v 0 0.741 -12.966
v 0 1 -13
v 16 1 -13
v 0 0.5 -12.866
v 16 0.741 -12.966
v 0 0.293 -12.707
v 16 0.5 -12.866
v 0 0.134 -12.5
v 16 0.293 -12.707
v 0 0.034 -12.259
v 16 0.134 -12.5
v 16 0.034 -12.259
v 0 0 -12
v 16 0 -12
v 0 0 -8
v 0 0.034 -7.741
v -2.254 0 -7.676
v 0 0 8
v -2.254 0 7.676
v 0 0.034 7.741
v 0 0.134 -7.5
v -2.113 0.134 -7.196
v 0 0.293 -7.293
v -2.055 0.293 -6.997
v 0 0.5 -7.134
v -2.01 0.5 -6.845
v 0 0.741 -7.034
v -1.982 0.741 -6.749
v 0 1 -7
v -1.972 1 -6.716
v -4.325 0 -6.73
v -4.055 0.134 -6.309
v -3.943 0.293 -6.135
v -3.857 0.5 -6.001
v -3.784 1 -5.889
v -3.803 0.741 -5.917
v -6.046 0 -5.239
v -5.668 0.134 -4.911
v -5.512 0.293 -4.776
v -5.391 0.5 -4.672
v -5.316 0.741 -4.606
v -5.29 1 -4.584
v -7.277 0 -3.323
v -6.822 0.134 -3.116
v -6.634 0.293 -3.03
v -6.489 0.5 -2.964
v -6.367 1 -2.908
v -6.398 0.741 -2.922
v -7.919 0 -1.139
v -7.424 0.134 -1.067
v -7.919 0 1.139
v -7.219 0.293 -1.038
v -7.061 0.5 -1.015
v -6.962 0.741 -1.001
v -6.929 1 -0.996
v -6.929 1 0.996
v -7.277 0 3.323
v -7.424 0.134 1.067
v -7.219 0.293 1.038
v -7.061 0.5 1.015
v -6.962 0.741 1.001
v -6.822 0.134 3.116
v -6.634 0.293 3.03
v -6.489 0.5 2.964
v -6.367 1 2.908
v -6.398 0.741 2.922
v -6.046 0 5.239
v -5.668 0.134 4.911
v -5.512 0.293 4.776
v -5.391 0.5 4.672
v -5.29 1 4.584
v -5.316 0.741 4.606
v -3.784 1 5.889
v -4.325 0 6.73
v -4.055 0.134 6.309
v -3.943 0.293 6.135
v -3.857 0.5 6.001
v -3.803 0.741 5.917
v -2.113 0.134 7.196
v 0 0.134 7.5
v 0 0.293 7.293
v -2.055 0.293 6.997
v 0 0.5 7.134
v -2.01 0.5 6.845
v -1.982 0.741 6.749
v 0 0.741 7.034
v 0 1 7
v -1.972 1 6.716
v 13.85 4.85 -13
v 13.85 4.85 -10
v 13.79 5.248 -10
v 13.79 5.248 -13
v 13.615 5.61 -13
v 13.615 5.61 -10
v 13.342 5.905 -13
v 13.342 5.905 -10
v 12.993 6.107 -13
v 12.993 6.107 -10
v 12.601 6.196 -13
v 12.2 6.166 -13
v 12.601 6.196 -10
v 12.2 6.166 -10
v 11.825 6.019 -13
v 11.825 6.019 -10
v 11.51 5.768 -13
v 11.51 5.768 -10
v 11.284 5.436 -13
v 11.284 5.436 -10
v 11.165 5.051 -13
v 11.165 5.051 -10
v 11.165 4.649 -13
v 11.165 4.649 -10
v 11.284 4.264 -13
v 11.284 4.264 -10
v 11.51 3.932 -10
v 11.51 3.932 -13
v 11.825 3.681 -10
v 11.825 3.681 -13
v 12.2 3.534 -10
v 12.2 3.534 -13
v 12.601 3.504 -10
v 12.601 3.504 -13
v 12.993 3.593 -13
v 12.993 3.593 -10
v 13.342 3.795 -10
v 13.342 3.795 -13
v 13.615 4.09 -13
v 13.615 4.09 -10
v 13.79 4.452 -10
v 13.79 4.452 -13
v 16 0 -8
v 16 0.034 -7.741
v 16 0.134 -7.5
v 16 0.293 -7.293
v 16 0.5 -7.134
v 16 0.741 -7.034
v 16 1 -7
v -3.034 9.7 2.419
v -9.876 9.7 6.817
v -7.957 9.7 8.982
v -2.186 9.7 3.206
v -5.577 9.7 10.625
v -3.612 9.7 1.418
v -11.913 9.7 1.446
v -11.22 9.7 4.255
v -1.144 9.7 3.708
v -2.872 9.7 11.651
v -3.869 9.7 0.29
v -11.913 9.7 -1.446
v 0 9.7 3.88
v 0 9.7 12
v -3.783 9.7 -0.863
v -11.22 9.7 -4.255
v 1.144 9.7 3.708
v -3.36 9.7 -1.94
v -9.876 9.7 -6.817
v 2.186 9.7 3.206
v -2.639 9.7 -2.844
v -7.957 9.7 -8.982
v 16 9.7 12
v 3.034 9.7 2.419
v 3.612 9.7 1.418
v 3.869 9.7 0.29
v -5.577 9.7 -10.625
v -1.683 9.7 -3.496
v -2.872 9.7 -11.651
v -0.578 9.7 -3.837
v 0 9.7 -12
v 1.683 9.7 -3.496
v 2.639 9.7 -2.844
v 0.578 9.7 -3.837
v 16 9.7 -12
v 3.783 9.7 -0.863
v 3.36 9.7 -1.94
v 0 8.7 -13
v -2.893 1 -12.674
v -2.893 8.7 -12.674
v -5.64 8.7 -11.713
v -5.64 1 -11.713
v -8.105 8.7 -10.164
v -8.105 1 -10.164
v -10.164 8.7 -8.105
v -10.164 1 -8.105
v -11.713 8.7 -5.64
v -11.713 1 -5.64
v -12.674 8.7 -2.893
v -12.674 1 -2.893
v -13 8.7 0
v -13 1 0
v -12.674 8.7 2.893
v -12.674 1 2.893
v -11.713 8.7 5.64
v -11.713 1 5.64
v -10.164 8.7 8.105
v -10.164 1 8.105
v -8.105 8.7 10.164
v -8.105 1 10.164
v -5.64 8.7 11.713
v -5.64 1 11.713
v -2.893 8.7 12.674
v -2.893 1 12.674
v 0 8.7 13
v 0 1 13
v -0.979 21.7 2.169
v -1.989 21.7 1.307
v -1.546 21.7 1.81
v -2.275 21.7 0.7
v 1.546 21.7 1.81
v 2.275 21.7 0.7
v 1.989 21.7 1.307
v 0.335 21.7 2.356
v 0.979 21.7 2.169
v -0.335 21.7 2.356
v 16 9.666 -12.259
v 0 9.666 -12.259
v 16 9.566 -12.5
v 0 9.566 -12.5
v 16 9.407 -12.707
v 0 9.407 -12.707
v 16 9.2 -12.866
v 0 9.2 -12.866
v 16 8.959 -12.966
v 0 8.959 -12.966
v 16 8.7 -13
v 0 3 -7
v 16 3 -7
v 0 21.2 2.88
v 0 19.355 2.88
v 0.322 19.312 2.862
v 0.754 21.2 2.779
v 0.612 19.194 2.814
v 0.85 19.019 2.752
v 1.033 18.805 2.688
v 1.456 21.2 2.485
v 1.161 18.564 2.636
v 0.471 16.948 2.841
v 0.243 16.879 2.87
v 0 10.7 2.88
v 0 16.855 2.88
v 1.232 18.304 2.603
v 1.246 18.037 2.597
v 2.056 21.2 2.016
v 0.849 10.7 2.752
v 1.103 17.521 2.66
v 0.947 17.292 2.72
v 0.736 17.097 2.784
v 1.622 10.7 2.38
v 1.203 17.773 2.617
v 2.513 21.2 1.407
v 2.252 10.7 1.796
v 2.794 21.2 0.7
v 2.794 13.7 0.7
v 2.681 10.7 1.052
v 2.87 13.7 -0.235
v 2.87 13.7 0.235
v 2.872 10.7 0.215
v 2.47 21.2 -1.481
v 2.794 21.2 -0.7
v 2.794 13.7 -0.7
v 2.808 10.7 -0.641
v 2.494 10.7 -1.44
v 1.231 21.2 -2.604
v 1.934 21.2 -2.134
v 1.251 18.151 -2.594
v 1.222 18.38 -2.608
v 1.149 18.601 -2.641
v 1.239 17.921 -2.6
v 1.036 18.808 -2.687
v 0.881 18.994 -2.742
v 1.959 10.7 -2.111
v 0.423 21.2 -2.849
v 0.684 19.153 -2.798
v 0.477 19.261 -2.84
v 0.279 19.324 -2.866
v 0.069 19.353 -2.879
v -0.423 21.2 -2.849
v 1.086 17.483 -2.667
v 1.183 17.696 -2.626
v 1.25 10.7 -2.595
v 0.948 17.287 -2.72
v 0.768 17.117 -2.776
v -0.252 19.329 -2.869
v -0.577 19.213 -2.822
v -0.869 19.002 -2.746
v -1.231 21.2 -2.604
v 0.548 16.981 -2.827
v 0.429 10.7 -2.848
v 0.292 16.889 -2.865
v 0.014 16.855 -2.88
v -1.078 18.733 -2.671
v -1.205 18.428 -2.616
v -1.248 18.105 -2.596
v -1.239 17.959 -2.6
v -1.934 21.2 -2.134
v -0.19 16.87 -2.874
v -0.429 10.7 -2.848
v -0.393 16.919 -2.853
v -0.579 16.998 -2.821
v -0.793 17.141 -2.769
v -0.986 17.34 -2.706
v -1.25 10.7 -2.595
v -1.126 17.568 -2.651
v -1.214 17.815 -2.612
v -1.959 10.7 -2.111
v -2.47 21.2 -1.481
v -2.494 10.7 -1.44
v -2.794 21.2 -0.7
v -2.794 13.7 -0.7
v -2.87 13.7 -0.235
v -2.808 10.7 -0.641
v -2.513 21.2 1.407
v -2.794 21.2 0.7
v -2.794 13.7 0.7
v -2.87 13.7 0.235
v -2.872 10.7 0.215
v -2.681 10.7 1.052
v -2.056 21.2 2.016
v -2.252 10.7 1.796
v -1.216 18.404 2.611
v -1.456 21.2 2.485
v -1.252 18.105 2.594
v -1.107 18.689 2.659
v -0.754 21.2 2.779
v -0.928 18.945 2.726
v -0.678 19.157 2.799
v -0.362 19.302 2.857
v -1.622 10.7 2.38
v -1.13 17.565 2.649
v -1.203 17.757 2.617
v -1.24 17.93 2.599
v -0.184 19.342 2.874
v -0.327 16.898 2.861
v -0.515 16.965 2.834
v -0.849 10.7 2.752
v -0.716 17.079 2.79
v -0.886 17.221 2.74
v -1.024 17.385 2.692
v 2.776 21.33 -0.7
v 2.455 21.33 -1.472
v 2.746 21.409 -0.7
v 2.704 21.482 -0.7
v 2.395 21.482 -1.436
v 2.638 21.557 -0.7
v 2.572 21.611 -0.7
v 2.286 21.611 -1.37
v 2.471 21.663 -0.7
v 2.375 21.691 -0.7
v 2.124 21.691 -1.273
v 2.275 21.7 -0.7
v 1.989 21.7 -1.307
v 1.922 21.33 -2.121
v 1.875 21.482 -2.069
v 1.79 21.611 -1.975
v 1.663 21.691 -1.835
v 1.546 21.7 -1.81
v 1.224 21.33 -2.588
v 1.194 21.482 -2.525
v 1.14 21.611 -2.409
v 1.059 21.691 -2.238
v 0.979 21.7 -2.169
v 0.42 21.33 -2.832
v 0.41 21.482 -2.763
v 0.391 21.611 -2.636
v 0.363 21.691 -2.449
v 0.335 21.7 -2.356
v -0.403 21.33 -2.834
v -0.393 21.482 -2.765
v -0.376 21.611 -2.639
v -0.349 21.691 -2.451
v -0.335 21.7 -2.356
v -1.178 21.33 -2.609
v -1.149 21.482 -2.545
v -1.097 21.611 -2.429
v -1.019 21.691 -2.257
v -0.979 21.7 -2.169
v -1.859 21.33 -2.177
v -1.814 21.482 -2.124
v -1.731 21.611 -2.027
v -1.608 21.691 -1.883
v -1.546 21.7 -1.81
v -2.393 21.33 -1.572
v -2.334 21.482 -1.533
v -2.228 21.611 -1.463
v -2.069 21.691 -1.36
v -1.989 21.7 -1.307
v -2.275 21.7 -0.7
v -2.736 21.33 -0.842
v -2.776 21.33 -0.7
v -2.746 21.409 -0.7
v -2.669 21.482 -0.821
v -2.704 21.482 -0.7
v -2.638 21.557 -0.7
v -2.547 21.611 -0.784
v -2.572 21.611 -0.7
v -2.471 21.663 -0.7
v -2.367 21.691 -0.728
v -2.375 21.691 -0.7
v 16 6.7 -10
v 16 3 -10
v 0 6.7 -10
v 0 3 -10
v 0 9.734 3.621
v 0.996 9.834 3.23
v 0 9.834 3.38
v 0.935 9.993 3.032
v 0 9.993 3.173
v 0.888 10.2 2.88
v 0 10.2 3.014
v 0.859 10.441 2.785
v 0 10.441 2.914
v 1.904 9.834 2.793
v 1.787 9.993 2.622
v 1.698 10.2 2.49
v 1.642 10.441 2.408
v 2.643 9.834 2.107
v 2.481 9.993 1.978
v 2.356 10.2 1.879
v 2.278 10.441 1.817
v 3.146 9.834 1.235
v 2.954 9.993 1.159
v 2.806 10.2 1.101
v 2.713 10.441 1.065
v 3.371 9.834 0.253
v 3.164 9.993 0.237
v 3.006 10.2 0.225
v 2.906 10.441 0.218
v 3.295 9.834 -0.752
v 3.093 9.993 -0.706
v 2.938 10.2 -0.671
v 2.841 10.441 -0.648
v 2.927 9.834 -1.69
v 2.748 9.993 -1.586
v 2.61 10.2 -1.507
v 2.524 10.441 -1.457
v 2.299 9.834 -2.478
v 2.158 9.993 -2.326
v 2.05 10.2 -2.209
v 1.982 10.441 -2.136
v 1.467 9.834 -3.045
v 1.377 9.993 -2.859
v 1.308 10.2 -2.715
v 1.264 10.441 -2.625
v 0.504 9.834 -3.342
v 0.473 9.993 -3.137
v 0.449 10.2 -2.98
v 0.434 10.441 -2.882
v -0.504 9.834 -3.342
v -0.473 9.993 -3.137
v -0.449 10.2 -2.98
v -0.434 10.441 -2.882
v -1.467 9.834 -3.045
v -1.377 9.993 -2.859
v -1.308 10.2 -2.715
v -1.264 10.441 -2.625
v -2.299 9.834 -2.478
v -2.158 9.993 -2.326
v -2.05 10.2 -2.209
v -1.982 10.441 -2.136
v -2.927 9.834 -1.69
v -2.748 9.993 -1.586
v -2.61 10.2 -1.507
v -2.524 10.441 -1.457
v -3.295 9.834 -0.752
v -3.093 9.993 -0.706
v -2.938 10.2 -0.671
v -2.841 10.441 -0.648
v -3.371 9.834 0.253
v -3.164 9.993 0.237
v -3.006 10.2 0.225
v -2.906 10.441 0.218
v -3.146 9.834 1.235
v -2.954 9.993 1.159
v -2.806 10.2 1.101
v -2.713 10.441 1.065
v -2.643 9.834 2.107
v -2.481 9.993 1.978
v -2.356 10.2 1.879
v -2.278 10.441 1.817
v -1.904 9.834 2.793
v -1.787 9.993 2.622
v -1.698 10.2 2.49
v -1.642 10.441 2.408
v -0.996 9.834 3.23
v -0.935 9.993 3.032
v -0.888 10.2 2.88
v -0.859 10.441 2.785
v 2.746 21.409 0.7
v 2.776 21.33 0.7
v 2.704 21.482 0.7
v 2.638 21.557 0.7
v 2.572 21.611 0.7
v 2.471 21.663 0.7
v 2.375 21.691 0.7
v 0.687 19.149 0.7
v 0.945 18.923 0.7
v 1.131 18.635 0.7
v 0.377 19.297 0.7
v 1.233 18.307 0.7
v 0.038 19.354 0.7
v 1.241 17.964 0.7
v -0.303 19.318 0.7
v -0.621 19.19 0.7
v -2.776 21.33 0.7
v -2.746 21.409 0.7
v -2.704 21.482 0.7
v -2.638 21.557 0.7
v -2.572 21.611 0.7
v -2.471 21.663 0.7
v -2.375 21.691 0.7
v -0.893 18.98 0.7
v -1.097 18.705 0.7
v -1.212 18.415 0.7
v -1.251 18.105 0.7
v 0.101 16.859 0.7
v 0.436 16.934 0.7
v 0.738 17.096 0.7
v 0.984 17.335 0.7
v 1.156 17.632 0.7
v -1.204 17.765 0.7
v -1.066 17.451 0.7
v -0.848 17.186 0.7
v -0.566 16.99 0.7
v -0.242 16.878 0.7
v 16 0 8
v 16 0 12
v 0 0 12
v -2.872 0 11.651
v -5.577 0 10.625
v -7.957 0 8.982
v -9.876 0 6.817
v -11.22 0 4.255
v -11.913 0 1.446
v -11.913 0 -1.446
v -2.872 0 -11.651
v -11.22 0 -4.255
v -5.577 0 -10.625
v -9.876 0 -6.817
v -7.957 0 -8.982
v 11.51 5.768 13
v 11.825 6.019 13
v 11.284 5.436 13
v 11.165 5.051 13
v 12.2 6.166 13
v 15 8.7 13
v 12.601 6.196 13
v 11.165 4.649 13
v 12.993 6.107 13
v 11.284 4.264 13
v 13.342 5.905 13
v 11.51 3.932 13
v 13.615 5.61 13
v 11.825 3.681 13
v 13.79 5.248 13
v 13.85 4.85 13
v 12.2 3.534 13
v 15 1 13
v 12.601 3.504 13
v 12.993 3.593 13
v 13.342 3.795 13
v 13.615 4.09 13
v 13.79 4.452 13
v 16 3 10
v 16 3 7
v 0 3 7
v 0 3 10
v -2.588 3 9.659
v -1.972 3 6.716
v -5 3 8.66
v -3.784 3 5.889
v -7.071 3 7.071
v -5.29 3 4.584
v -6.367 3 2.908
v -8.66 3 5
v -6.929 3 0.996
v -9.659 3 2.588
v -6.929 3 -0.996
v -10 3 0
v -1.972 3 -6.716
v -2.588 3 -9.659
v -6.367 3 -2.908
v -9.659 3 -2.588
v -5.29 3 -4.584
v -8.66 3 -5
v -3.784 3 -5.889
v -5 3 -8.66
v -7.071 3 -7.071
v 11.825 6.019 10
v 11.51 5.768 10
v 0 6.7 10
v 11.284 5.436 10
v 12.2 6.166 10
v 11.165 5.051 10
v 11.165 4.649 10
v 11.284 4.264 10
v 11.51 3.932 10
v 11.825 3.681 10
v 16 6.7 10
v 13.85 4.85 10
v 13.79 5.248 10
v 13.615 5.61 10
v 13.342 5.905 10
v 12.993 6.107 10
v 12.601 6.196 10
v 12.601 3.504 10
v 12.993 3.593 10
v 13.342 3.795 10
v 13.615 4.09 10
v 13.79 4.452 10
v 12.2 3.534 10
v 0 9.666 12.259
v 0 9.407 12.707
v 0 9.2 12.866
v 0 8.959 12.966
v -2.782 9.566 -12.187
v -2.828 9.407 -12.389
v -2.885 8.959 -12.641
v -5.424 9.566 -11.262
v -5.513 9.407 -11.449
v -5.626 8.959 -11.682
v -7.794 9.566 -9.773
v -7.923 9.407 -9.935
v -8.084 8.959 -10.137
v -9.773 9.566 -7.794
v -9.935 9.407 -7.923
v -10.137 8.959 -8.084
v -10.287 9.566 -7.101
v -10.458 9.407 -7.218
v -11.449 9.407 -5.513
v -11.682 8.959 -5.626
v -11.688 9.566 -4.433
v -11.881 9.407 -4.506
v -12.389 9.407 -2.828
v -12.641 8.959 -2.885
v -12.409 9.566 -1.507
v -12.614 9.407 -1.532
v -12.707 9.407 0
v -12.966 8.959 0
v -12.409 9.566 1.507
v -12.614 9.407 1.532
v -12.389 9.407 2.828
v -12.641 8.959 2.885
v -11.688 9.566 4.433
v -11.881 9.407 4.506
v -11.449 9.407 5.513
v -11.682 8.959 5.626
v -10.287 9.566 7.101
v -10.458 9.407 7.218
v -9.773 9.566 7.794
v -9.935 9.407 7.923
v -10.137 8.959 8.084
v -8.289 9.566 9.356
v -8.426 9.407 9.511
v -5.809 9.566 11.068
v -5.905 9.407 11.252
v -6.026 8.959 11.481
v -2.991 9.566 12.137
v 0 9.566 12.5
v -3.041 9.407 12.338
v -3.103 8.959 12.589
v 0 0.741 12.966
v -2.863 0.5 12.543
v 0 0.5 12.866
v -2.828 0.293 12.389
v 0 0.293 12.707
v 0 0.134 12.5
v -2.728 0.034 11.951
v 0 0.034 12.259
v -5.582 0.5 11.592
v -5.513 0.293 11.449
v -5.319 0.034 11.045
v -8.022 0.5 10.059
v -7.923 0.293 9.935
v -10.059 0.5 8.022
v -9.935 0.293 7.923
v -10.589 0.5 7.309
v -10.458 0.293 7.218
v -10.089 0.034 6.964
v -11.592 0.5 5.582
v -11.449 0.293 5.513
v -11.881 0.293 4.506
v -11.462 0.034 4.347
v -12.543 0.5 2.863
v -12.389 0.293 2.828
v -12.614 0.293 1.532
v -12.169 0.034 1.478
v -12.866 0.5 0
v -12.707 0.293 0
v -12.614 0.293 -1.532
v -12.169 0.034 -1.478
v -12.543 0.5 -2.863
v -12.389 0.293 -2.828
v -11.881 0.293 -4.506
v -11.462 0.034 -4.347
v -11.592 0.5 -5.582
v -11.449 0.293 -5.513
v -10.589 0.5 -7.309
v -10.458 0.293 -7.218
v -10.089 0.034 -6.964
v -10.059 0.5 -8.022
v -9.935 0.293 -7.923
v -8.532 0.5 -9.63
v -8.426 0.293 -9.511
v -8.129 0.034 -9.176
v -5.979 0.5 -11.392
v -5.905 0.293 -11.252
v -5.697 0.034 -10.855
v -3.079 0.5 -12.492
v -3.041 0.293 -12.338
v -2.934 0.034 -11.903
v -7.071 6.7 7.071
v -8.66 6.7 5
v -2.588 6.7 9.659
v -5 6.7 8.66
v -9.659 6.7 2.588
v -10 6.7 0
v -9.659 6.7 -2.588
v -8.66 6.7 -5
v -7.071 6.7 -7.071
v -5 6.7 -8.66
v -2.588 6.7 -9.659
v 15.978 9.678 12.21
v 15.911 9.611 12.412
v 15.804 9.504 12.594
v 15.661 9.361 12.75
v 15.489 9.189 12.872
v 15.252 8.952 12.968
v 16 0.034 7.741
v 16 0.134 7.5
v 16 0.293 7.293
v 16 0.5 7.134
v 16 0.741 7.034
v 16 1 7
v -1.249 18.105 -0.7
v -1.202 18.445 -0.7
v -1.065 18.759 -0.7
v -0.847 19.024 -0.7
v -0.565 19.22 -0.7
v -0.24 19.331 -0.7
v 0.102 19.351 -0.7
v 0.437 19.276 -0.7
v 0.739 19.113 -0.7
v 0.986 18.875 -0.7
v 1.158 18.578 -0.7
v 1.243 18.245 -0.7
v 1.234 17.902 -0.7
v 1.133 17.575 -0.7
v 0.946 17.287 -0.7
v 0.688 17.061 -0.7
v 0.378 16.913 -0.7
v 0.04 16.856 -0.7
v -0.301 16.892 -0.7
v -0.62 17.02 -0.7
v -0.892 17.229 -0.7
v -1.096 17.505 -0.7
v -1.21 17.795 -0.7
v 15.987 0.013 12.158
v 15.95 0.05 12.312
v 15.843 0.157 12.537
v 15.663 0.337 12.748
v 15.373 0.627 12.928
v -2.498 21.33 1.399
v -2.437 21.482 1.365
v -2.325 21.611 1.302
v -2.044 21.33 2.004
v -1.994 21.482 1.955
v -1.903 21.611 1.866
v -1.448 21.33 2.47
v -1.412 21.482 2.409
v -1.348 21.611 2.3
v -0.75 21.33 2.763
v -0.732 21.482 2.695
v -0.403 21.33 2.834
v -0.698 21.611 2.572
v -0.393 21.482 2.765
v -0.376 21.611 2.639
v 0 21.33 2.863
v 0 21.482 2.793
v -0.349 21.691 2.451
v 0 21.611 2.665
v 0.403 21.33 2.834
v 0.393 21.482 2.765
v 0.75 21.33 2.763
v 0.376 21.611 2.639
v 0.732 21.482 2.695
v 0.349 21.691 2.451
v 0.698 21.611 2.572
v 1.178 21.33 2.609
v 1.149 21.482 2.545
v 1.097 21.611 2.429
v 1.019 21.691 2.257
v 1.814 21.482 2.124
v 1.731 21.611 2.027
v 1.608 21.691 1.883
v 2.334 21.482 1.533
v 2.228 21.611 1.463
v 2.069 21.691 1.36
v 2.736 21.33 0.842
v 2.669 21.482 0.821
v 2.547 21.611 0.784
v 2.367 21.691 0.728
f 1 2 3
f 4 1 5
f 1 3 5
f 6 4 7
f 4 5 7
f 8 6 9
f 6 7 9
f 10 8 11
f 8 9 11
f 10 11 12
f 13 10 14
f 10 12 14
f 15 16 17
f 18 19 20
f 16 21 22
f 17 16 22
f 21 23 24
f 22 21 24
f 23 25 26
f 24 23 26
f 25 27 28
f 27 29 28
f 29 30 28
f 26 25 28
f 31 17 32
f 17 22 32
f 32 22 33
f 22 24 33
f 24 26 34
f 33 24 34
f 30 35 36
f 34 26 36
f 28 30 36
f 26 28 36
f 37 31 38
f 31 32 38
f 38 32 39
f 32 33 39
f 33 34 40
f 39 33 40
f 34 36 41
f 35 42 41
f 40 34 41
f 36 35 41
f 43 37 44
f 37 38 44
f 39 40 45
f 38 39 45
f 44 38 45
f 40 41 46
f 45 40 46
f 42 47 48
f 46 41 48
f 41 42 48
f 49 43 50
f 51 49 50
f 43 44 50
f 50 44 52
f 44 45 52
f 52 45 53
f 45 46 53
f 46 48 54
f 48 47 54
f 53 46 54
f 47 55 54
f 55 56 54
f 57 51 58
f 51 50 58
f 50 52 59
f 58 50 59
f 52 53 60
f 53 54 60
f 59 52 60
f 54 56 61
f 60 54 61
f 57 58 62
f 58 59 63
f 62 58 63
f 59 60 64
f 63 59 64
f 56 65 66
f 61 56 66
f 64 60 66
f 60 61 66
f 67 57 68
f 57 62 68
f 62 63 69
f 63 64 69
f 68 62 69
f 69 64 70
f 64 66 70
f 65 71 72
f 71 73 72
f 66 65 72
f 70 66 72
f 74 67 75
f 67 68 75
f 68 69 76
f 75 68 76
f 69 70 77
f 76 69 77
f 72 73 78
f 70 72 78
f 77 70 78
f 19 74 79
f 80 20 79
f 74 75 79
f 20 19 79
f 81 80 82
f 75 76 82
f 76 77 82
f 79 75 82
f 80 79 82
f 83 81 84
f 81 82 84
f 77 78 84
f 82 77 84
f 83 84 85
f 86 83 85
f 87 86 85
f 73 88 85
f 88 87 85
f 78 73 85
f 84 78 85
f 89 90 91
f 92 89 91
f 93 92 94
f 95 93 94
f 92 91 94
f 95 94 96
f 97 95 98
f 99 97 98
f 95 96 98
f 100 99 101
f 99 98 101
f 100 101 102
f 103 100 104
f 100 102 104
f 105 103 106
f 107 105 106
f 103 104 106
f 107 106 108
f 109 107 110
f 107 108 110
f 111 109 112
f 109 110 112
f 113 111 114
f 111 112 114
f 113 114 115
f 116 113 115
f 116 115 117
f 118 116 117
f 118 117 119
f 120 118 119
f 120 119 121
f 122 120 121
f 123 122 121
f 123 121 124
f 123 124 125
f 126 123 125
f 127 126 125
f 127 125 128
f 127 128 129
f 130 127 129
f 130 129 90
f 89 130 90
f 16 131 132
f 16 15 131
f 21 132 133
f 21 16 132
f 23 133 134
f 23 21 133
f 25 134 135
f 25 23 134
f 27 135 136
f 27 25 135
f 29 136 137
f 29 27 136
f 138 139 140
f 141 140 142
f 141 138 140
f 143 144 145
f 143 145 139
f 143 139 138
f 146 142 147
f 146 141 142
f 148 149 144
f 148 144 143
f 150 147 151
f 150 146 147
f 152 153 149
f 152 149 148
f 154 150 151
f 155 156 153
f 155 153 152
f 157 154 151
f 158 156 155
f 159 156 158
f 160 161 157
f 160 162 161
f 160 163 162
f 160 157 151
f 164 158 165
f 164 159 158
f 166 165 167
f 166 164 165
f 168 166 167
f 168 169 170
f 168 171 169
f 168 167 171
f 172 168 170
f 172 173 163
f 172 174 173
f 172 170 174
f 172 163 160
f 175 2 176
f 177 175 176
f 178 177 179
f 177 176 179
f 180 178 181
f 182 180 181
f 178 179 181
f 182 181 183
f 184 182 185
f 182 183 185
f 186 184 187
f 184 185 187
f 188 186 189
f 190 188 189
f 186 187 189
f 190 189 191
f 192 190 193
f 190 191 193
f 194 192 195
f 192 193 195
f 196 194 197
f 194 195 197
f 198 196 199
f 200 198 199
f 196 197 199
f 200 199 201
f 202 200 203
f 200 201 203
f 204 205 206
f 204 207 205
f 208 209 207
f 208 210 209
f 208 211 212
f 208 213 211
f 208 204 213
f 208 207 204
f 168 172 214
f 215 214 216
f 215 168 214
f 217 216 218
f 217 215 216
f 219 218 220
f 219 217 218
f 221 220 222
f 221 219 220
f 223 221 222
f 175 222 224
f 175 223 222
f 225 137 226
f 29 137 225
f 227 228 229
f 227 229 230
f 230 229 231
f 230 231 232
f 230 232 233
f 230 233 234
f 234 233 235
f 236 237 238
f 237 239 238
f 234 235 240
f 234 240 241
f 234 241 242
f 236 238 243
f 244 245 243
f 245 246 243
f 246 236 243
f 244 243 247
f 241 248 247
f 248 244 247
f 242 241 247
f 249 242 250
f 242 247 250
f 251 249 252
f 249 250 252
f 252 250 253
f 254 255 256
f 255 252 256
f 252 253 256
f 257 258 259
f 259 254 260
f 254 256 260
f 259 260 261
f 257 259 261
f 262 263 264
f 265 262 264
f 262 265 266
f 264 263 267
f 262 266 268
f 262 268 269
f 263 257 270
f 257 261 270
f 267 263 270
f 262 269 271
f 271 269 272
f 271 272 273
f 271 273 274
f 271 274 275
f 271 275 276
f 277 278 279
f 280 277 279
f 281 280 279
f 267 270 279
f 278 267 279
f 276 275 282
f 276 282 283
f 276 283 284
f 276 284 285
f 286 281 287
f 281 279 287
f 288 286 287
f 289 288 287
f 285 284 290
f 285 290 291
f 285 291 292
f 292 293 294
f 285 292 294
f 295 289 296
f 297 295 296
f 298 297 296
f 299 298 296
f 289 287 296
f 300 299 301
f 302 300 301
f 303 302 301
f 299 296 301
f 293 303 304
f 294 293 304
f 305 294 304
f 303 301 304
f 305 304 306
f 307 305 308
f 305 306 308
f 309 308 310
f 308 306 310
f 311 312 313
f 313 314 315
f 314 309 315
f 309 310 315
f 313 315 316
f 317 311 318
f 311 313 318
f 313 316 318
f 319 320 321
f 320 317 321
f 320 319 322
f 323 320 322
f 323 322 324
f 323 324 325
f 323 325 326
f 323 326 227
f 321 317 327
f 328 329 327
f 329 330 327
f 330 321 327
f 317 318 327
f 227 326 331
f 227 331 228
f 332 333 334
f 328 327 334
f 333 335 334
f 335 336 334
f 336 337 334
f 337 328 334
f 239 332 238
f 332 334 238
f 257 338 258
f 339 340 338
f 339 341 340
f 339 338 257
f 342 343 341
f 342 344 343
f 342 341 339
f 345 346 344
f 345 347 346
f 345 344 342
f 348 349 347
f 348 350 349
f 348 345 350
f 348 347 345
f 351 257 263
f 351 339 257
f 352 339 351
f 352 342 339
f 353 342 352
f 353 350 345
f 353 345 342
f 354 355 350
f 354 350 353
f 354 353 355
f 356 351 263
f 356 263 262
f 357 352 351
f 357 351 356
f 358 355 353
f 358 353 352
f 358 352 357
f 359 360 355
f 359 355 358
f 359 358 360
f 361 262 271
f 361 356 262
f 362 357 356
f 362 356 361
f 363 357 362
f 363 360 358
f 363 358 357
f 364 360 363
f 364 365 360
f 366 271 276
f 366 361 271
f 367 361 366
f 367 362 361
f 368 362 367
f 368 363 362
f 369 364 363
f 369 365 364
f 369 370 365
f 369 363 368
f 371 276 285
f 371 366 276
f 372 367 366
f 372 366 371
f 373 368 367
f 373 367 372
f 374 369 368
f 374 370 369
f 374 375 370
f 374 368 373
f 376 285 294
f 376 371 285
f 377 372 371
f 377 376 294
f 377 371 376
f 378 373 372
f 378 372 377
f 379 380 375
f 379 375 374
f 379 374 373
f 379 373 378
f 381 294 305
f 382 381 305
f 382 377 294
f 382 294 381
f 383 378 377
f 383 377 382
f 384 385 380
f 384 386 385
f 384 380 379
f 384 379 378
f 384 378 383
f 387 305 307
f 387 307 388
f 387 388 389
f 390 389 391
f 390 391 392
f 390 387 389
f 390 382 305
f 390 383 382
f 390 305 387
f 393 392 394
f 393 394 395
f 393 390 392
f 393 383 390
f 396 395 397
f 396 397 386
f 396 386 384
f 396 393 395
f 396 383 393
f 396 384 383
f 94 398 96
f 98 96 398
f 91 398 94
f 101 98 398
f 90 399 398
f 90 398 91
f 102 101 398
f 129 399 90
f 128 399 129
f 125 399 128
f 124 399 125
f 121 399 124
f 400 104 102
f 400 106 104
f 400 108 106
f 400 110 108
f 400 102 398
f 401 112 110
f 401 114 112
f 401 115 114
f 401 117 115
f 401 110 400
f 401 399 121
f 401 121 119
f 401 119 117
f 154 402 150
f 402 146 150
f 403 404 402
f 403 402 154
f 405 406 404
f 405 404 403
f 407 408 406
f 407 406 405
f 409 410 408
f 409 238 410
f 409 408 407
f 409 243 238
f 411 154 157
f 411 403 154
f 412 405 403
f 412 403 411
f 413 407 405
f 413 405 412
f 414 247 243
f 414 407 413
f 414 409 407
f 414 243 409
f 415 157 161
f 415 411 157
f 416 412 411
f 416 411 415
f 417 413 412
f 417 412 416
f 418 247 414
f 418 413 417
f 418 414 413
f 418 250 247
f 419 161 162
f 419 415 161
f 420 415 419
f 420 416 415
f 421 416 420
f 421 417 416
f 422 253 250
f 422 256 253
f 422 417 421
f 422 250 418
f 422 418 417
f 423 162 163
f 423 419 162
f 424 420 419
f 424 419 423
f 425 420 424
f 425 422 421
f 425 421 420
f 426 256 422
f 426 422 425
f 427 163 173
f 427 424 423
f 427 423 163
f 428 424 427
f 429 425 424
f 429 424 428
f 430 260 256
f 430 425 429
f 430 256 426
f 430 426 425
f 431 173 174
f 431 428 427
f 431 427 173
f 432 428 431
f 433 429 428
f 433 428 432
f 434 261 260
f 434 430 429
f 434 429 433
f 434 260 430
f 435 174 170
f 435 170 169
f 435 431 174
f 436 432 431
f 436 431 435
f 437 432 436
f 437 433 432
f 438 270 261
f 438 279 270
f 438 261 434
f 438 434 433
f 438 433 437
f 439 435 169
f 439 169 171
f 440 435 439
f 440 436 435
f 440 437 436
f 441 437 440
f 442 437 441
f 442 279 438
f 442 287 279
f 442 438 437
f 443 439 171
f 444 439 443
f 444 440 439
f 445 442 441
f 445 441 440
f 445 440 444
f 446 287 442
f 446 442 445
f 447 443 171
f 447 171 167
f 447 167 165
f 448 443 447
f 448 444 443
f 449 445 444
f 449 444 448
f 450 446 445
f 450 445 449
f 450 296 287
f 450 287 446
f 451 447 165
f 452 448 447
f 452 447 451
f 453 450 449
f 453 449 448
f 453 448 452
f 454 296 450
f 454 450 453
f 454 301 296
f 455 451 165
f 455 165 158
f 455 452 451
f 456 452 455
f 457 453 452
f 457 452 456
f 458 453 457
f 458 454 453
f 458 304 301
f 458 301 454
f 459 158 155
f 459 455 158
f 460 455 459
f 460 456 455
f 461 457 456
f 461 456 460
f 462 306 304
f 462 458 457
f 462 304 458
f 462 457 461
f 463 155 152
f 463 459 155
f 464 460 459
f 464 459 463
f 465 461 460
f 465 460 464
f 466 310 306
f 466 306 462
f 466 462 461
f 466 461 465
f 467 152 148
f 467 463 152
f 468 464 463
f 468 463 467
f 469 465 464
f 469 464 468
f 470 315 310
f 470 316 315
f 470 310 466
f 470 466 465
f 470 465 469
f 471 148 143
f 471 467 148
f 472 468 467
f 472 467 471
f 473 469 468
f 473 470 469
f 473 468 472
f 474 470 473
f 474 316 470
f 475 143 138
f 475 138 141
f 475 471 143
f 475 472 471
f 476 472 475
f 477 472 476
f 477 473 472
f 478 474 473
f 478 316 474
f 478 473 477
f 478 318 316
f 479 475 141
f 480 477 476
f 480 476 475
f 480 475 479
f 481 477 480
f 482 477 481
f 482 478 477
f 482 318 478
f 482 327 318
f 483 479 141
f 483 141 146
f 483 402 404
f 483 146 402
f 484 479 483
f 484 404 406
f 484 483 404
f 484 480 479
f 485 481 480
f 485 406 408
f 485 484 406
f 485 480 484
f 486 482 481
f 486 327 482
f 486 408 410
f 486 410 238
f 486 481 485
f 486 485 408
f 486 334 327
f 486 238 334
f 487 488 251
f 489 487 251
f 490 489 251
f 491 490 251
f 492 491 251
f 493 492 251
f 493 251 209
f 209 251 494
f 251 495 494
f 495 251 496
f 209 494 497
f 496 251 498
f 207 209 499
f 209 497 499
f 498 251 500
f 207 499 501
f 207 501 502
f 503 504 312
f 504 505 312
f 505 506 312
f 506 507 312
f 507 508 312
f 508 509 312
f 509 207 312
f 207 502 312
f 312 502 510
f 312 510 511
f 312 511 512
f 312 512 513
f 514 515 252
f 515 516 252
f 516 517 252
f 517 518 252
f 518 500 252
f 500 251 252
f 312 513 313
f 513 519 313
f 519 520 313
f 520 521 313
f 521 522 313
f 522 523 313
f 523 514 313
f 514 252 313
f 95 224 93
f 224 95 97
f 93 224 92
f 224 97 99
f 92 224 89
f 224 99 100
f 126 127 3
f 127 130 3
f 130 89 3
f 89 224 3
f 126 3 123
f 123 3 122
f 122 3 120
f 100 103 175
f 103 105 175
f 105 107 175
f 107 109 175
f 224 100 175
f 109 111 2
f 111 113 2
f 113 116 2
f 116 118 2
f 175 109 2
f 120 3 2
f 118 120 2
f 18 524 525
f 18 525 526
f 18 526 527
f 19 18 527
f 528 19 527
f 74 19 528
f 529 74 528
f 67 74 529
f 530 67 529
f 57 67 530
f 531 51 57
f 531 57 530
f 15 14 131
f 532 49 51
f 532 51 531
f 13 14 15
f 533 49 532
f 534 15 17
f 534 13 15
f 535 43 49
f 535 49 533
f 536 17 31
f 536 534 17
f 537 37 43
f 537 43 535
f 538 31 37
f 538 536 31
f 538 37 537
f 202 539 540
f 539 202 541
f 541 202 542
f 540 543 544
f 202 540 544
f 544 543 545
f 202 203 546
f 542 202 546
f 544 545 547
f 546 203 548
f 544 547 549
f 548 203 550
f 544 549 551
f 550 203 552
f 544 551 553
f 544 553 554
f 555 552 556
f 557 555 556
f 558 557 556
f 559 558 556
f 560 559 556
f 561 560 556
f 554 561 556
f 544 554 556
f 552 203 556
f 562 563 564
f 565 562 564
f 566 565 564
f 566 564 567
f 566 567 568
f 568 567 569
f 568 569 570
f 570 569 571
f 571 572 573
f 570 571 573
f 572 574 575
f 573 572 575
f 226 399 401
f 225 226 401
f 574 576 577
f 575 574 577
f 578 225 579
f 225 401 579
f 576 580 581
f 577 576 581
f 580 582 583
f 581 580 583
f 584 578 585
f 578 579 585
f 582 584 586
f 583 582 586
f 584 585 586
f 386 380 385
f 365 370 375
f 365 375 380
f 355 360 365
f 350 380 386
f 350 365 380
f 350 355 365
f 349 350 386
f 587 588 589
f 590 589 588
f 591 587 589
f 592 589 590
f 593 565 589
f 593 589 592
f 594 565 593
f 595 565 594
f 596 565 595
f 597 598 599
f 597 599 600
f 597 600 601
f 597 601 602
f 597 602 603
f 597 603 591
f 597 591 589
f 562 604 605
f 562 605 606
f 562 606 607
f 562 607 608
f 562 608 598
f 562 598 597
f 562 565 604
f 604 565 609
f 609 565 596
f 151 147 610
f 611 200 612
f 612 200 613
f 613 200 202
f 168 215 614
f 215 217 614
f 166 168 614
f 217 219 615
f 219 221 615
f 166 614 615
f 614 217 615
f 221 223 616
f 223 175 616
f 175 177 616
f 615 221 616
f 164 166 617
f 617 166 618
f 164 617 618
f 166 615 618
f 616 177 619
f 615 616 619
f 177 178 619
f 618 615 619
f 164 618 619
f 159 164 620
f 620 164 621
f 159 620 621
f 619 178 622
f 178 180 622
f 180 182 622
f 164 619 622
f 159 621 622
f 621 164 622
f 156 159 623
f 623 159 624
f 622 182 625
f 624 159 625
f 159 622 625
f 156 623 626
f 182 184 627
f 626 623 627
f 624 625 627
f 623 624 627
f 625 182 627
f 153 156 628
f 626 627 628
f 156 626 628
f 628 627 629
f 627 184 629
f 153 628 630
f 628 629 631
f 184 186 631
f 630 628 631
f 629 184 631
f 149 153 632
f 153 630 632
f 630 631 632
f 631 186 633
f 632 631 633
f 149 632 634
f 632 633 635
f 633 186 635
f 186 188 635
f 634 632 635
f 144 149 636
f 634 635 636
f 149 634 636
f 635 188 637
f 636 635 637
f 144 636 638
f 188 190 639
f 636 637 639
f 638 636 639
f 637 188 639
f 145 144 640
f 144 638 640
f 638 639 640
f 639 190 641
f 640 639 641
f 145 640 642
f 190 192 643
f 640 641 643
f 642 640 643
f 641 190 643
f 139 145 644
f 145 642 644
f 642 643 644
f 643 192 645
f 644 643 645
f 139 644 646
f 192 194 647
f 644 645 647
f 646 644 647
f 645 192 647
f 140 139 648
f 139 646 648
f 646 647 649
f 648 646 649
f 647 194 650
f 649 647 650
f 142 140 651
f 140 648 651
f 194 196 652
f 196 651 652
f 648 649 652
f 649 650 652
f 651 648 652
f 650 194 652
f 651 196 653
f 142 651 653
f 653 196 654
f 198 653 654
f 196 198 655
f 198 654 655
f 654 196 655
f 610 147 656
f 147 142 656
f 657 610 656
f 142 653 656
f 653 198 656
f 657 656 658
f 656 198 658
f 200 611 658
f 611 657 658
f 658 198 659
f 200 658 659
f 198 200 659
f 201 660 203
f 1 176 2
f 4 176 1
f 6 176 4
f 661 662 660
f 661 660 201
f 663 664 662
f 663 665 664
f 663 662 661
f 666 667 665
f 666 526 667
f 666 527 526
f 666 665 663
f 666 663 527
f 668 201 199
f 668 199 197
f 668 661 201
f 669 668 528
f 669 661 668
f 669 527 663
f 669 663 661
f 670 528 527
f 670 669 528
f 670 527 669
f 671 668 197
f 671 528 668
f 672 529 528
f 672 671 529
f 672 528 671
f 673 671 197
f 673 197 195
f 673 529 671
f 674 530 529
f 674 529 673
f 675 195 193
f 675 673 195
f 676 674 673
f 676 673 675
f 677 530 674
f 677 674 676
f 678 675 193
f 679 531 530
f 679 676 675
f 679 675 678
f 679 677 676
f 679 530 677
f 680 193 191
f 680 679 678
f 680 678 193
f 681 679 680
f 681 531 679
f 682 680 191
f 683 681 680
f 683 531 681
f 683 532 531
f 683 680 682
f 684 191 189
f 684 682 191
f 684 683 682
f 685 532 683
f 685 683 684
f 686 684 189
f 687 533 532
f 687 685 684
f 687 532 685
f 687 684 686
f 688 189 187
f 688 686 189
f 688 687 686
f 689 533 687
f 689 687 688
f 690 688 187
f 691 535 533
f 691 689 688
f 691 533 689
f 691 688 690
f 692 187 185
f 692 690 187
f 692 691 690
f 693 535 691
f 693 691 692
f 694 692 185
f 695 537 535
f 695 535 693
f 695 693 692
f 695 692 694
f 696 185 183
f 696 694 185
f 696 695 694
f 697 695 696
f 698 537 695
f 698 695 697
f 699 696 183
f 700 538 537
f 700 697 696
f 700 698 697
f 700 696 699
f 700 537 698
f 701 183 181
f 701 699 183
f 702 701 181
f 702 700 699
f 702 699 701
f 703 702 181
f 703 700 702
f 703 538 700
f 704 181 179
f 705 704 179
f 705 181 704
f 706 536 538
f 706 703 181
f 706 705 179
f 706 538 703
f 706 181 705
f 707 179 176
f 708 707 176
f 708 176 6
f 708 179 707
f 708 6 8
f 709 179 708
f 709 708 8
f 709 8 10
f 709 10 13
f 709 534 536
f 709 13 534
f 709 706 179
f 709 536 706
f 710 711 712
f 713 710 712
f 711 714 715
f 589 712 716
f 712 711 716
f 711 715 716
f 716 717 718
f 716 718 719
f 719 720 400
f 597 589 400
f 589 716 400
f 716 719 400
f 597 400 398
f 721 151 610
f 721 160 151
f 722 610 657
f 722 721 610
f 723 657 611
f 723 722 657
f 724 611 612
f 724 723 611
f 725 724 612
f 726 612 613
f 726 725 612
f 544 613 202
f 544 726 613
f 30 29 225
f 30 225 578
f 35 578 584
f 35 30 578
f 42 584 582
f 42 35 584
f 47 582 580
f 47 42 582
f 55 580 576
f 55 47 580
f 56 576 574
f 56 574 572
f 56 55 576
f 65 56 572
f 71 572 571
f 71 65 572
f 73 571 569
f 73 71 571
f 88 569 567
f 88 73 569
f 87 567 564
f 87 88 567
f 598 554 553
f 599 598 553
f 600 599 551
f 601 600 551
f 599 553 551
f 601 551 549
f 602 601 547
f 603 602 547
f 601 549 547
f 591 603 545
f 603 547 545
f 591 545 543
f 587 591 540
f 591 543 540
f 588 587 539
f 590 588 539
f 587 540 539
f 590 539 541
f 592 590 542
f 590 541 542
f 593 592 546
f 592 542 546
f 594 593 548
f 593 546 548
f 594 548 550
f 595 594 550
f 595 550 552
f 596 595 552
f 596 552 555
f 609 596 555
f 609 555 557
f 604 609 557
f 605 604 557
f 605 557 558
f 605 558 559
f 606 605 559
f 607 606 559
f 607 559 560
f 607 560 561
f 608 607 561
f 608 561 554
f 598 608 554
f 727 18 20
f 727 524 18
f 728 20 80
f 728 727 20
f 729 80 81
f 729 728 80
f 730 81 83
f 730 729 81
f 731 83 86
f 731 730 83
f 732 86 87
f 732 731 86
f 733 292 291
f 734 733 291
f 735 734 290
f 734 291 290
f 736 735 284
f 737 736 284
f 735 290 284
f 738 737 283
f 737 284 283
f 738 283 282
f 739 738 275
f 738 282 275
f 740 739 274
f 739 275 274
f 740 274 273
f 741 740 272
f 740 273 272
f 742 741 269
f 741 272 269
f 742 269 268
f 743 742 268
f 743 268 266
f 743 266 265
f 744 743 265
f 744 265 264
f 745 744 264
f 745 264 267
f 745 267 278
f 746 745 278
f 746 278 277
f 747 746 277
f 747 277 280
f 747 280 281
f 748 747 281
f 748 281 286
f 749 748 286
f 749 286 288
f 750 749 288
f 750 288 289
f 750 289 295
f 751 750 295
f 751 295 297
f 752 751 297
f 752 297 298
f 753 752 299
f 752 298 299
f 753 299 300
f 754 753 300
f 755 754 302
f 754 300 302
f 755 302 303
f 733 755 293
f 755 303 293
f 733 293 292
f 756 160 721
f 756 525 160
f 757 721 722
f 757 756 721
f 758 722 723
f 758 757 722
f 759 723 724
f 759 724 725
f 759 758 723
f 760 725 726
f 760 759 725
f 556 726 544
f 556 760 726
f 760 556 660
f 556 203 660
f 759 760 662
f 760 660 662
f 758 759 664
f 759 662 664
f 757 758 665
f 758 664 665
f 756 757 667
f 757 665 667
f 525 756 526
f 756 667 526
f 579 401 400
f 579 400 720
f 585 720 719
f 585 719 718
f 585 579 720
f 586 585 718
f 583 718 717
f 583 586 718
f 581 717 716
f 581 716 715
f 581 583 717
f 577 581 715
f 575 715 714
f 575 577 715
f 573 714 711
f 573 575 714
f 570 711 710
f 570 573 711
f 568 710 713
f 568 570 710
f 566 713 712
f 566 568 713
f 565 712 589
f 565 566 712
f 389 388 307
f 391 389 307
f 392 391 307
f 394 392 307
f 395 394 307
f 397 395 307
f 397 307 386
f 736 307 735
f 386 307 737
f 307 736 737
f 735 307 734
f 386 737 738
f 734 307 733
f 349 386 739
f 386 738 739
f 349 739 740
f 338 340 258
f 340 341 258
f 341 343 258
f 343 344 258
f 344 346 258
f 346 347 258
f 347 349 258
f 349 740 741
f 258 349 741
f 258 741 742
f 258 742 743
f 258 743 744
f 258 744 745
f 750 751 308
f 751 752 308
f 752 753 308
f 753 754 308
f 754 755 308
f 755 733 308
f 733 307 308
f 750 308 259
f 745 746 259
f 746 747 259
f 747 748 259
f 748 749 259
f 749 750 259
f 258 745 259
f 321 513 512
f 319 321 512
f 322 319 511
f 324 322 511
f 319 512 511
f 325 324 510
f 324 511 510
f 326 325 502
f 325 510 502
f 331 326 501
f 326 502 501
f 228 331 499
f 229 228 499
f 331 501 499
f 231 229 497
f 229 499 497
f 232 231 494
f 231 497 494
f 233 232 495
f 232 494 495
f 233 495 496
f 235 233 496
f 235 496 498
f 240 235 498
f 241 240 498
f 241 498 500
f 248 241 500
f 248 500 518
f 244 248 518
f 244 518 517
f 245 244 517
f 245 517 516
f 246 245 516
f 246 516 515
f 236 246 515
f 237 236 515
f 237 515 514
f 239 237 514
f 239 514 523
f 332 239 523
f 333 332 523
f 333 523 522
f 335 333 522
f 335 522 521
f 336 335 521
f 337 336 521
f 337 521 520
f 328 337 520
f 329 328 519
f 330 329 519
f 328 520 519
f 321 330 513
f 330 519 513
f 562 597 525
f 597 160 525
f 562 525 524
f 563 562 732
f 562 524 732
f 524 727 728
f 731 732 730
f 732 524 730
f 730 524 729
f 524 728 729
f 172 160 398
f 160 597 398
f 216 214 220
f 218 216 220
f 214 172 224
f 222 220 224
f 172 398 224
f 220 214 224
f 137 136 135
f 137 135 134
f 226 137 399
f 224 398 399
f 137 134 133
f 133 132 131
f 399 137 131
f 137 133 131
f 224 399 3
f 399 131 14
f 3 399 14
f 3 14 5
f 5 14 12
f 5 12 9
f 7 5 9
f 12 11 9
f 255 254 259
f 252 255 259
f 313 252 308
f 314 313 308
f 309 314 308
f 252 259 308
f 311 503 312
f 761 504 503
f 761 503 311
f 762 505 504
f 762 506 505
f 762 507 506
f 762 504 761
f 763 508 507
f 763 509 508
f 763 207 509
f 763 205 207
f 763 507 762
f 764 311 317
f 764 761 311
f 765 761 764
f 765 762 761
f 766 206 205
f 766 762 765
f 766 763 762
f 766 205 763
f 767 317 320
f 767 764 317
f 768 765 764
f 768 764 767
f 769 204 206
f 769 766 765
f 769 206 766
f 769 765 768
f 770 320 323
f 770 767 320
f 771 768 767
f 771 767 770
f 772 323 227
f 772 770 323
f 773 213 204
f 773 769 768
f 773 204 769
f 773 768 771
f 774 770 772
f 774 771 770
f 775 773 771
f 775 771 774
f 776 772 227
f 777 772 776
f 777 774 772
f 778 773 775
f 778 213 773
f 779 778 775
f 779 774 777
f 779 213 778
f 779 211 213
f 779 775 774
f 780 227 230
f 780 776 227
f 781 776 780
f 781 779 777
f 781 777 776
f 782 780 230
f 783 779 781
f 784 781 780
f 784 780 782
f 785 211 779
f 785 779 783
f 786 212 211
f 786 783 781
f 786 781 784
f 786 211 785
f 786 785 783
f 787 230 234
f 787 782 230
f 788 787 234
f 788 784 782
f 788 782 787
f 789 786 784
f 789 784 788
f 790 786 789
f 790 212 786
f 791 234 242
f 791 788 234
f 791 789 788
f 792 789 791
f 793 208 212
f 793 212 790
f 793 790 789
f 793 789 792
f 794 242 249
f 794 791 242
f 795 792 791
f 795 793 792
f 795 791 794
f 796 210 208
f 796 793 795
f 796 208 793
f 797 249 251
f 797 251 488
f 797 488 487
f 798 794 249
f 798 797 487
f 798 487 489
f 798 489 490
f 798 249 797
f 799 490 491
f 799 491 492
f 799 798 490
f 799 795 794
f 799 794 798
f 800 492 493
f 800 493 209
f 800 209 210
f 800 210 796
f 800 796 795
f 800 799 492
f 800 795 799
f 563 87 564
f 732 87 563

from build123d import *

# Parameters (mm, degrees)
BOSS_EXTRUDE1_DEPTH   = 3
BOSS_EXTRUDE2_DEPTH   = 3.7
BOSS_EXTRUDE3_DEPTH   = 3
SKETCH4_R             = 2.88
BOSS_EXTRUDE4_DEPTH   = 12
F_2_5MM_DOWEL_HOLE1_D = 2.5
SKETCH8_R             = 1.35
CUT_EXTRUDE1_DEPTH    = 38.455173265
FILLET1_R             = 1
FILLET2_R             = 1
CUT_EXTRUDE2_START    = -8
CUT_EXTRUDE2_DEPTH    = 8
FILLET3_R             = 0.5


with BuildPart() as part:
    # Sketch1 → Boss-Extrude1 (new body)
    with BuildSketch(Plane(origin=(0, 0, 0), x_dir=(1, 0, 0), z_dir=(0, 1, 0))):
        with BuildLine():
            Line((0, 13), (16, 13))
            Line((16, 13), (16, 7))
            Line((16, 7), (0, 7))
            ThreePointArc((0, 7), (-7, 0), (0, -7))
            Line((0, -7), (16, -7))
            Line((16, -7), (16, -13))
            Line((16, -13), (0, -13))
            ThreePointArc((0, -13), (-13, 0), (0, 13))
        make_face()
    extrude(amount=BOSS_EXTRUDE1_DEPTH)

    # Sketch2 → Boss-Extrude2 (add)
    with BuildSketch(Plane(origin=(0, 3, 0), x_dir=(1, 0, 0), z_dir=(0, 1, 0))):
        with BuildLine():
            Line((0, 13), (16, 13))
            Line((16, 13), (16, 10))
            Line((16, 10), (0, 10))
            ThreePointArc((0, 10), (-10, 0), (0, -10))
            Line((0, -10), (16, -10))
            Line((16, -10), (16, -13))
            Line((16, -13), (0, -13))
            ThreePointArc((0, -13), (-13, 0), (0, 13))
        make_face()
    extrude(amount=BOSS_EXTRUDE2_DEPTH)

    # Sketch3 → Boss-Extrude3 (add)
    with BuildSketch(Plane(origin=(0, 6.7, 0), x_dir=(1, 0, 0), z_dir=(0, 1, 0))):
        with BuildLine():
            Line((16, 13), (0, 13))
            ThreePointArc((0, 13), (-13, 0), (0, -13))
            Line((0, -13), (16, -13))
            Line((16, -13), (16, -7))
            Line((16, -7), (16, 7))
            Line((16, 7), (16, 13))
        make_face()
    extrude(amount=BOSS_EXTRUDE3_DEPTH)

    # Sketch4 → Boss-Extrude4 (add)
    with BuildSketch(Plane(origin=(0, 9.7, 0), x_dir=(1, 0, 0), z_dir=(0, 1, 0))):
        with Locations(Location((0, 0, 0), (0, 0, 270))):
            Circle(SKETCH4_R)
    extrude(amount=BOSS_EXTRUDE4_DEPTH)

    # Ø2.5mm Dowel Hole1 (through all)
    with Locations(Plane(origin=(-0.002429038, 18.104937254, 2.879998976), x_dir=(0.999999644325, 0, 0.000843415861), z_dir=(-0.000843415861, 0, 0.999999644325))):
        with Locations((0, 0)):
            Hole(F_2_5MM_DOWEL_HOLE1_D / 2)

    # Sketch8 → Cut-Extrude1 (cut, through all)
    with BuildSketch(Plane.XY.offset(13)):
        with Locations((12.5, 4.85)):
            Circle(SKETCH8_R)
    extrude(amount=-CUT_EXTRUDE1_DEPTH, mode=Mode.SUBTRACT)

    # Fillet1
    fillet1_edges = [part.edges().sort_by_distance(p)[0] for p in [
        (8, 0, -13),
        (8, 0, -7),
        (-7, 0, 0),
        (16, 4.85, 13),
        (-13, 9.7, 0),
        (8, 9.7, 13),
        (8, 9.7, -13),
        (8, 0, 7),
        (8, 0, 13),
        (-13, 0, 0),
    ]]
    fillet(fillet1_edges, radius=FILLET1_R)

    # Fillet2
    fillet2_edges = [part.edges().sort_by_distance(p)[0] for p in [
        (0, 9.7, -2.88),
    ]]
    fillet(fillet2_edges, radius=FILLET2_R)

    # Sketch10 → Cut-Extrude2 (cut)
    with BuildSketch(Plane(origin=(0, 21.7, 0), x_dir=(1, 0, 0), z_dir=(0, 1, 0)).offset(CUT_EXTRUDE2_START)):
        with BuildLine():
            Line((-2.793635624, 0.7), (2.793635624, 0.7))
            ThreePointArc((2.793635624, 0.7), (2.88, 0), (2.793635624, -0.7))
            Line((2.793635624, -0.7), (-2.793635624, -0.7))
            ThreePointArc((-2.793635624, -0.7), (-2.88, 0), (-2.793635624, 0.7))
        make_face()
    extrude(amount=CUT_EXTRUDE2_DEPTH, mode=Mode.SUBTRACT)

    # Fillet3
    fillet3_edges = [part.edges().sort_by_distance(p)[0] for p in [
        (0, 21.7, -2.88),
        (1.771778767, 21.7, 2.270506551),
    ]]
    fillet(fillet3_edges, radius=FILLET3_R)


solid = part.part
